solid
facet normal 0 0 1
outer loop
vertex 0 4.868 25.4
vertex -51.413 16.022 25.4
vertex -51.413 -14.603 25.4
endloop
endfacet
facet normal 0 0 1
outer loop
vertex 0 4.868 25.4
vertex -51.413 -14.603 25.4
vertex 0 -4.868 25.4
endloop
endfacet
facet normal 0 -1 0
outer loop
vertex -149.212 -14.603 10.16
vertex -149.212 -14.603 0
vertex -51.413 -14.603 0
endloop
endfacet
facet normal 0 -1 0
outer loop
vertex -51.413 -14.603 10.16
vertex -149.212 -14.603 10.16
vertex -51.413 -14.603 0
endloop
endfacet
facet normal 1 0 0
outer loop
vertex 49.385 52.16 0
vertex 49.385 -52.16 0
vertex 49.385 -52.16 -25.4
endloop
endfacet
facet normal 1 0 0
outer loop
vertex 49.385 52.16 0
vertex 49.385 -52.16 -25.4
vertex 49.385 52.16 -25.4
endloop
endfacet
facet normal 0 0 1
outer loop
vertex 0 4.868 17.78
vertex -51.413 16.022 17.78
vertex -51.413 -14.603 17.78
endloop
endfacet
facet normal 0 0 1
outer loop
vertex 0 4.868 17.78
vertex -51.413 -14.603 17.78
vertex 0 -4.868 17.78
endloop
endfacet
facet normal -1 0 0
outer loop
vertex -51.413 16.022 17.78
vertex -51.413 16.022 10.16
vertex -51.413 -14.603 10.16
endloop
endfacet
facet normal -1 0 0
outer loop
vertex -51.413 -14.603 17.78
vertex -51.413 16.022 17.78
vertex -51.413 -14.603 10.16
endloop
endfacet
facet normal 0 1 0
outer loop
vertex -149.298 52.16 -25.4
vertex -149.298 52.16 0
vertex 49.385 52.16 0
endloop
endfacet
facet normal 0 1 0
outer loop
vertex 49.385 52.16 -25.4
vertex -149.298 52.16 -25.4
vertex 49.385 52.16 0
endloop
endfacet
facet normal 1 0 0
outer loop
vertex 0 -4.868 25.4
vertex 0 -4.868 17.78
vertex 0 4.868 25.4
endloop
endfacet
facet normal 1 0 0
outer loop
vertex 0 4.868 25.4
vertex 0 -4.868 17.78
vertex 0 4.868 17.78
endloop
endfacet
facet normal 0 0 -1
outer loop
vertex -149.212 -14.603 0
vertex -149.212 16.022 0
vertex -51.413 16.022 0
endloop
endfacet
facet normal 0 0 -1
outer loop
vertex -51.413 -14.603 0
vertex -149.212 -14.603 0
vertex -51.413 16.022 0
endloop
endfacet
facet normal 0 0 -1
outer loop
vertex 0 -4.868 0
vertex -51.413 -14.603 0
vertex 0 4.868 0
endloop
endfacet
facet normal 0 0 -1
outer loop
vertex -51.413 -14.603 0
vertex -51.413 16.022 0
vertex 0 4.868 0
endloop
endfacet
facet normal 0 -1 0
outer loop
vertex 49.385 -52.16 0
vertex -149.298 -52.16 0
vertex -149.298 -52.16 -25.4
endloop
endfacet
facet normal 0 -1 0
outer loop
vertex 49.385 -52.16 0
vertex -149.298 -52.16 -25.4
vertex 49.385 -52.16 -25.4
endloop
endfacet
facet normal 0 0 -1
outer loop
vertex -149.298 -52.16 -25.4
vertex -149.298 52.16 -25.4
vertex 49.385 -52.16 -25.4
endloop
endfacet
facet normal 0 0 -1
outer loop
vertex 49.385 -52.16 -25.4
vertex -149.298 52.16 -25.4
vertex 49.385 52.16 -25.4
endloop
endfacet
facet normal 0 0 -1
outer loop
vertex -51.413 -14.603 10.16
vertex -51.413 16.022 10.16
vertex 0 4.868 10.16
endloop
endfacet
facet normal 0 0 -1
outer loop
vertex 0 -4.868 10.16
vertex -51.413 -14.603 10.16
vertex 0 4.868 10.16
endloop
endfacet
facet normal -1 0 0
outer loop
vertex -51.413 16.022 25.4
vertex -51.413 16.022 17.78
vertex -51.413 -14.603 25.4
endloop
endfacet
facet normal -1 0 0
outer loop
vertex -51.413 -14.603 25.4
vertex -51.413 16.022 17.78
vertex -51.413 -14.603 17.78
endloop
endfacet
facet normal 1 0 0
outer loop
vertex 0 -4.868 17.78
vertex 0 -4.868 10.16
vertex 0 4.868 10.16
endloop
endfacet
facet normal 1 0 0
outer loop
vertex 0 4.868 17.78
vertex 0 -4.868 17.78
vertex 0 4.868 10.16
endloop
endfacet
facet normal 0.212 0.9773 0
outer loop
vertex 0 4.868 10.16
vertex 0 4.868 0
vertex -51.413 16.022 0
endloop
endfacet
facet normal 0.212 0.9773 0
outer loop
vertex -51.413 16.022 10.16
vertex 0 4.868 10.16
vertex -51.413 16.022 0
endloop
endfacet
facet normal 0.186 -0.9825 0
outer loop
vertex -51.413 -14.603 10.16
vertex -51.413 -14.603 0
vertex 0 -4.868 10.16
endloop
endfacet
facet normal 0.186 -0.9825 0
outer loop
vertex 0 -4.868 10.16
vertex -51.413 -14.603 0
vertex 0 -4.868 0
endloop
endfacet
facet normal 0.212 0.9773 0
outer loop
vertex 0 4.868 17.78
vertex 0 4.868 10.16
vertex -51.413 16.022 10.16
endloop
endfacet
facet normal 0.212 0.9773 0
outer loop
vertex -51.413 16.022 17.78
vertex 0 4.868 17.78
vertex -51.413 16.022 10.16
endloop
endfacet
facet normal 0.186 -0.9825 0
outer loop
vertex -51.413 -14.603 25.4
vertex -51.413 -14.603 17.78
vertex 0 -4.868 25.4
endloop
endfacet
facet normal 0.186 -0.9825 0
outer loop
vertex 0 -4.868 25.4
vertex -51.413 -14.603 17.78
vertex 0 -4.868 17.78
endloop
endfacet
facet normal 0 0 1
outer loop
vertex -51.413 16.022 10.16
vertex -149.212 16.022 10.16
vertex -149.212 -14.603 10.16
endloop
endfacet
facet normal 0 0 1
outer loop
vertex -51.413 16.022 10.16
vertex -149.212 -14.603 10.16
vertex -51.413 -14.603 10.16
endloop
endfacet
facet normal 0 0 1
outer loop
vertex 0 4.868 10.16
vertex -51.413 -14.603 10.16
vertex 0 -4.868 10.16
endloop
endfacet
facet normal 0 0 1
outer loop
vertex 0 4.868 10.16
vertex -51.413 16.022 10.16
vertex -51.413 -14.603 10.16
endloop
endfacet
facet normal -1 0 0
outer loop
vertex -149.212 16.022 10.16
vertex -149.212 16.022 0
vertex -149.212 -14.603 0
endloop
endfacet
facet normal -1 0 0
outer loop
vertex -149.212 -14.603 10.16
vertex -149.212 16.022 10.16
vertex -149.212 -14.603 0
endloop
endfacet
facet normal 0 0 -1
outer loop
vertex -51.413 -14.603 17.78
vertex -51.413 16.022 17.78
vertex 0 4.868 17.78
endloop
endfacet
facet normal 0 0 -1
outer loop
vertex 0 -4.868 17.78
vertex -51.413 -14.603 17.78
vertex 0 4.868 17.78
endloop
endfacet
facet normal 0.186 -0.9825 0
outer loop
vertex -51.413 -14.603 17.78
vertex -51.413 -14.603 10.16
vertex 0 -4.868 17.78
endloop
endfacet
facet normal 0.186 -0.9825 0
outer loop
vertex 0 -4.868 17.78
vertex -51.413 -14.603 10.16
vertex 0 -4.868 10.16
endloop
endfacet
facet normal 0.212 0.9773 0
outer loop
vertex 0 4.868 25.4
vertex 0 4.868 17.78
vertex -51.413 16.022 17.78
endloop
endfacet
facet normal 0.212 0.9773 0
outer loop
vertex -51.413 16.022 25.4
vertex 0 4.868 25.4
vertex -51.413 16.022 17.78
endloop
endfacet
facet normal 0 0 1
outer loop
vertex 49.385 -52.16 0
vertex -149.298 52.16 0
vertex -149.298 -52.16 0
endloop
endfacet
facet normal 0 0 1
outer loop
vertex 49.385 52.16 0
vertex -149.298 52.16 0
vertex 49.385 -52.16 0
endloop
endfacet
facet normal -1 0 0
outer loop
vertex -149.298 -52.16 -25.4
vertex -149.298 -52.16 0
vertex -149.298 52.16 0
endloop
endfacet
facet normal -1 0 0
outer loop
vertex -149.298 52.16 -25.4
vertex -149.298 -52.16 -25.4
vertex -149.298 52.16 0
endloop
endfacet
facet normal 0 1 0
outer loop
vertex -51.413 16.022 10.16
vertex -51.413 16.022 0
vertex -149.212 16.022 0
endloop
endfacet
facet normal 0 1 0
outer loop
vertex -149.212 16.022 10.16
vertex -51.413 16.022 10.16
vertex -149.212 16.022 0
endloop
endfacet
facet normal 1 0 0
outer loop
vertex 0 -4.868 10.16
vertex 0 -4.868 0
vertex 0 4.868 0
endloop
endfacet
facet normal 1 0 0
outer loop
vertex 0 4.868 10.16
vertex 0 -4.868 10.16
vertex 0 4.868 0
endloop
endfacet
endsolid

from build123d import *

# Parameters (mm, degrees)
F0_W     = 198.6827738583
F0_H     = 104.3191924691
F1_DEPTH = 25.4
F3_DEPTH = 10.16
F5_DEPTH = 7.62
F7_DEPTH = 7.62


# Not quite as in the source:
# - a feature names something its author has since deleted; it is built from what else it names


with BuildPart() as f1:
    # F0 (on Top) → F1 (new body)
    with BuildSketch(Plane.XY):
        with Locations((-49.9562527984, 0)):
            Rectangle(F0_W, F0_H)
    extrude(amount=-F1_DEPTH)


with BuildPart() as f3:
    # F2 (on face) → F3 (new body)
    with BuildSketch(Plane.XY):
        Polygon((0, 4.8675285652), (-51.4132715762, 16.0222817212), (-149.2118090391, 16.0222817212), (-149.2118090391, -14.602586627), (-51.4132715762, -14.602586627), (0, -4.8675285652), align=None)
    extrude(amount=F3_DEPTH)


with BuildPart() as f5:
    # F4 (on face) → F5 (new body)
    with BuildSketch(Plane.XY.offset(10.16)):
        Polygon((0, 4.8675285652), (-51.4132715762, 16.0222817212), (-51.4132715762, -14.602586627), (0, -4.8675285652), align=None)
    extrude(amount=F5_DEPTH)


with BuildPart() as f7:
    # F6 (on face) → F7 (new body)
    with BuildSketch(Plane.XY.offset(17.78)):
        Polygon((0, 4.8675285652), (-51.4132715762, 16.0222817212), (-51.4132715762, -14.602586627), (0, -4.8675285652), align=None)
    extrude(amount=F7_DEPTH)


solid = Compound([f1.part, f3.part, f5.part, f7.part])
